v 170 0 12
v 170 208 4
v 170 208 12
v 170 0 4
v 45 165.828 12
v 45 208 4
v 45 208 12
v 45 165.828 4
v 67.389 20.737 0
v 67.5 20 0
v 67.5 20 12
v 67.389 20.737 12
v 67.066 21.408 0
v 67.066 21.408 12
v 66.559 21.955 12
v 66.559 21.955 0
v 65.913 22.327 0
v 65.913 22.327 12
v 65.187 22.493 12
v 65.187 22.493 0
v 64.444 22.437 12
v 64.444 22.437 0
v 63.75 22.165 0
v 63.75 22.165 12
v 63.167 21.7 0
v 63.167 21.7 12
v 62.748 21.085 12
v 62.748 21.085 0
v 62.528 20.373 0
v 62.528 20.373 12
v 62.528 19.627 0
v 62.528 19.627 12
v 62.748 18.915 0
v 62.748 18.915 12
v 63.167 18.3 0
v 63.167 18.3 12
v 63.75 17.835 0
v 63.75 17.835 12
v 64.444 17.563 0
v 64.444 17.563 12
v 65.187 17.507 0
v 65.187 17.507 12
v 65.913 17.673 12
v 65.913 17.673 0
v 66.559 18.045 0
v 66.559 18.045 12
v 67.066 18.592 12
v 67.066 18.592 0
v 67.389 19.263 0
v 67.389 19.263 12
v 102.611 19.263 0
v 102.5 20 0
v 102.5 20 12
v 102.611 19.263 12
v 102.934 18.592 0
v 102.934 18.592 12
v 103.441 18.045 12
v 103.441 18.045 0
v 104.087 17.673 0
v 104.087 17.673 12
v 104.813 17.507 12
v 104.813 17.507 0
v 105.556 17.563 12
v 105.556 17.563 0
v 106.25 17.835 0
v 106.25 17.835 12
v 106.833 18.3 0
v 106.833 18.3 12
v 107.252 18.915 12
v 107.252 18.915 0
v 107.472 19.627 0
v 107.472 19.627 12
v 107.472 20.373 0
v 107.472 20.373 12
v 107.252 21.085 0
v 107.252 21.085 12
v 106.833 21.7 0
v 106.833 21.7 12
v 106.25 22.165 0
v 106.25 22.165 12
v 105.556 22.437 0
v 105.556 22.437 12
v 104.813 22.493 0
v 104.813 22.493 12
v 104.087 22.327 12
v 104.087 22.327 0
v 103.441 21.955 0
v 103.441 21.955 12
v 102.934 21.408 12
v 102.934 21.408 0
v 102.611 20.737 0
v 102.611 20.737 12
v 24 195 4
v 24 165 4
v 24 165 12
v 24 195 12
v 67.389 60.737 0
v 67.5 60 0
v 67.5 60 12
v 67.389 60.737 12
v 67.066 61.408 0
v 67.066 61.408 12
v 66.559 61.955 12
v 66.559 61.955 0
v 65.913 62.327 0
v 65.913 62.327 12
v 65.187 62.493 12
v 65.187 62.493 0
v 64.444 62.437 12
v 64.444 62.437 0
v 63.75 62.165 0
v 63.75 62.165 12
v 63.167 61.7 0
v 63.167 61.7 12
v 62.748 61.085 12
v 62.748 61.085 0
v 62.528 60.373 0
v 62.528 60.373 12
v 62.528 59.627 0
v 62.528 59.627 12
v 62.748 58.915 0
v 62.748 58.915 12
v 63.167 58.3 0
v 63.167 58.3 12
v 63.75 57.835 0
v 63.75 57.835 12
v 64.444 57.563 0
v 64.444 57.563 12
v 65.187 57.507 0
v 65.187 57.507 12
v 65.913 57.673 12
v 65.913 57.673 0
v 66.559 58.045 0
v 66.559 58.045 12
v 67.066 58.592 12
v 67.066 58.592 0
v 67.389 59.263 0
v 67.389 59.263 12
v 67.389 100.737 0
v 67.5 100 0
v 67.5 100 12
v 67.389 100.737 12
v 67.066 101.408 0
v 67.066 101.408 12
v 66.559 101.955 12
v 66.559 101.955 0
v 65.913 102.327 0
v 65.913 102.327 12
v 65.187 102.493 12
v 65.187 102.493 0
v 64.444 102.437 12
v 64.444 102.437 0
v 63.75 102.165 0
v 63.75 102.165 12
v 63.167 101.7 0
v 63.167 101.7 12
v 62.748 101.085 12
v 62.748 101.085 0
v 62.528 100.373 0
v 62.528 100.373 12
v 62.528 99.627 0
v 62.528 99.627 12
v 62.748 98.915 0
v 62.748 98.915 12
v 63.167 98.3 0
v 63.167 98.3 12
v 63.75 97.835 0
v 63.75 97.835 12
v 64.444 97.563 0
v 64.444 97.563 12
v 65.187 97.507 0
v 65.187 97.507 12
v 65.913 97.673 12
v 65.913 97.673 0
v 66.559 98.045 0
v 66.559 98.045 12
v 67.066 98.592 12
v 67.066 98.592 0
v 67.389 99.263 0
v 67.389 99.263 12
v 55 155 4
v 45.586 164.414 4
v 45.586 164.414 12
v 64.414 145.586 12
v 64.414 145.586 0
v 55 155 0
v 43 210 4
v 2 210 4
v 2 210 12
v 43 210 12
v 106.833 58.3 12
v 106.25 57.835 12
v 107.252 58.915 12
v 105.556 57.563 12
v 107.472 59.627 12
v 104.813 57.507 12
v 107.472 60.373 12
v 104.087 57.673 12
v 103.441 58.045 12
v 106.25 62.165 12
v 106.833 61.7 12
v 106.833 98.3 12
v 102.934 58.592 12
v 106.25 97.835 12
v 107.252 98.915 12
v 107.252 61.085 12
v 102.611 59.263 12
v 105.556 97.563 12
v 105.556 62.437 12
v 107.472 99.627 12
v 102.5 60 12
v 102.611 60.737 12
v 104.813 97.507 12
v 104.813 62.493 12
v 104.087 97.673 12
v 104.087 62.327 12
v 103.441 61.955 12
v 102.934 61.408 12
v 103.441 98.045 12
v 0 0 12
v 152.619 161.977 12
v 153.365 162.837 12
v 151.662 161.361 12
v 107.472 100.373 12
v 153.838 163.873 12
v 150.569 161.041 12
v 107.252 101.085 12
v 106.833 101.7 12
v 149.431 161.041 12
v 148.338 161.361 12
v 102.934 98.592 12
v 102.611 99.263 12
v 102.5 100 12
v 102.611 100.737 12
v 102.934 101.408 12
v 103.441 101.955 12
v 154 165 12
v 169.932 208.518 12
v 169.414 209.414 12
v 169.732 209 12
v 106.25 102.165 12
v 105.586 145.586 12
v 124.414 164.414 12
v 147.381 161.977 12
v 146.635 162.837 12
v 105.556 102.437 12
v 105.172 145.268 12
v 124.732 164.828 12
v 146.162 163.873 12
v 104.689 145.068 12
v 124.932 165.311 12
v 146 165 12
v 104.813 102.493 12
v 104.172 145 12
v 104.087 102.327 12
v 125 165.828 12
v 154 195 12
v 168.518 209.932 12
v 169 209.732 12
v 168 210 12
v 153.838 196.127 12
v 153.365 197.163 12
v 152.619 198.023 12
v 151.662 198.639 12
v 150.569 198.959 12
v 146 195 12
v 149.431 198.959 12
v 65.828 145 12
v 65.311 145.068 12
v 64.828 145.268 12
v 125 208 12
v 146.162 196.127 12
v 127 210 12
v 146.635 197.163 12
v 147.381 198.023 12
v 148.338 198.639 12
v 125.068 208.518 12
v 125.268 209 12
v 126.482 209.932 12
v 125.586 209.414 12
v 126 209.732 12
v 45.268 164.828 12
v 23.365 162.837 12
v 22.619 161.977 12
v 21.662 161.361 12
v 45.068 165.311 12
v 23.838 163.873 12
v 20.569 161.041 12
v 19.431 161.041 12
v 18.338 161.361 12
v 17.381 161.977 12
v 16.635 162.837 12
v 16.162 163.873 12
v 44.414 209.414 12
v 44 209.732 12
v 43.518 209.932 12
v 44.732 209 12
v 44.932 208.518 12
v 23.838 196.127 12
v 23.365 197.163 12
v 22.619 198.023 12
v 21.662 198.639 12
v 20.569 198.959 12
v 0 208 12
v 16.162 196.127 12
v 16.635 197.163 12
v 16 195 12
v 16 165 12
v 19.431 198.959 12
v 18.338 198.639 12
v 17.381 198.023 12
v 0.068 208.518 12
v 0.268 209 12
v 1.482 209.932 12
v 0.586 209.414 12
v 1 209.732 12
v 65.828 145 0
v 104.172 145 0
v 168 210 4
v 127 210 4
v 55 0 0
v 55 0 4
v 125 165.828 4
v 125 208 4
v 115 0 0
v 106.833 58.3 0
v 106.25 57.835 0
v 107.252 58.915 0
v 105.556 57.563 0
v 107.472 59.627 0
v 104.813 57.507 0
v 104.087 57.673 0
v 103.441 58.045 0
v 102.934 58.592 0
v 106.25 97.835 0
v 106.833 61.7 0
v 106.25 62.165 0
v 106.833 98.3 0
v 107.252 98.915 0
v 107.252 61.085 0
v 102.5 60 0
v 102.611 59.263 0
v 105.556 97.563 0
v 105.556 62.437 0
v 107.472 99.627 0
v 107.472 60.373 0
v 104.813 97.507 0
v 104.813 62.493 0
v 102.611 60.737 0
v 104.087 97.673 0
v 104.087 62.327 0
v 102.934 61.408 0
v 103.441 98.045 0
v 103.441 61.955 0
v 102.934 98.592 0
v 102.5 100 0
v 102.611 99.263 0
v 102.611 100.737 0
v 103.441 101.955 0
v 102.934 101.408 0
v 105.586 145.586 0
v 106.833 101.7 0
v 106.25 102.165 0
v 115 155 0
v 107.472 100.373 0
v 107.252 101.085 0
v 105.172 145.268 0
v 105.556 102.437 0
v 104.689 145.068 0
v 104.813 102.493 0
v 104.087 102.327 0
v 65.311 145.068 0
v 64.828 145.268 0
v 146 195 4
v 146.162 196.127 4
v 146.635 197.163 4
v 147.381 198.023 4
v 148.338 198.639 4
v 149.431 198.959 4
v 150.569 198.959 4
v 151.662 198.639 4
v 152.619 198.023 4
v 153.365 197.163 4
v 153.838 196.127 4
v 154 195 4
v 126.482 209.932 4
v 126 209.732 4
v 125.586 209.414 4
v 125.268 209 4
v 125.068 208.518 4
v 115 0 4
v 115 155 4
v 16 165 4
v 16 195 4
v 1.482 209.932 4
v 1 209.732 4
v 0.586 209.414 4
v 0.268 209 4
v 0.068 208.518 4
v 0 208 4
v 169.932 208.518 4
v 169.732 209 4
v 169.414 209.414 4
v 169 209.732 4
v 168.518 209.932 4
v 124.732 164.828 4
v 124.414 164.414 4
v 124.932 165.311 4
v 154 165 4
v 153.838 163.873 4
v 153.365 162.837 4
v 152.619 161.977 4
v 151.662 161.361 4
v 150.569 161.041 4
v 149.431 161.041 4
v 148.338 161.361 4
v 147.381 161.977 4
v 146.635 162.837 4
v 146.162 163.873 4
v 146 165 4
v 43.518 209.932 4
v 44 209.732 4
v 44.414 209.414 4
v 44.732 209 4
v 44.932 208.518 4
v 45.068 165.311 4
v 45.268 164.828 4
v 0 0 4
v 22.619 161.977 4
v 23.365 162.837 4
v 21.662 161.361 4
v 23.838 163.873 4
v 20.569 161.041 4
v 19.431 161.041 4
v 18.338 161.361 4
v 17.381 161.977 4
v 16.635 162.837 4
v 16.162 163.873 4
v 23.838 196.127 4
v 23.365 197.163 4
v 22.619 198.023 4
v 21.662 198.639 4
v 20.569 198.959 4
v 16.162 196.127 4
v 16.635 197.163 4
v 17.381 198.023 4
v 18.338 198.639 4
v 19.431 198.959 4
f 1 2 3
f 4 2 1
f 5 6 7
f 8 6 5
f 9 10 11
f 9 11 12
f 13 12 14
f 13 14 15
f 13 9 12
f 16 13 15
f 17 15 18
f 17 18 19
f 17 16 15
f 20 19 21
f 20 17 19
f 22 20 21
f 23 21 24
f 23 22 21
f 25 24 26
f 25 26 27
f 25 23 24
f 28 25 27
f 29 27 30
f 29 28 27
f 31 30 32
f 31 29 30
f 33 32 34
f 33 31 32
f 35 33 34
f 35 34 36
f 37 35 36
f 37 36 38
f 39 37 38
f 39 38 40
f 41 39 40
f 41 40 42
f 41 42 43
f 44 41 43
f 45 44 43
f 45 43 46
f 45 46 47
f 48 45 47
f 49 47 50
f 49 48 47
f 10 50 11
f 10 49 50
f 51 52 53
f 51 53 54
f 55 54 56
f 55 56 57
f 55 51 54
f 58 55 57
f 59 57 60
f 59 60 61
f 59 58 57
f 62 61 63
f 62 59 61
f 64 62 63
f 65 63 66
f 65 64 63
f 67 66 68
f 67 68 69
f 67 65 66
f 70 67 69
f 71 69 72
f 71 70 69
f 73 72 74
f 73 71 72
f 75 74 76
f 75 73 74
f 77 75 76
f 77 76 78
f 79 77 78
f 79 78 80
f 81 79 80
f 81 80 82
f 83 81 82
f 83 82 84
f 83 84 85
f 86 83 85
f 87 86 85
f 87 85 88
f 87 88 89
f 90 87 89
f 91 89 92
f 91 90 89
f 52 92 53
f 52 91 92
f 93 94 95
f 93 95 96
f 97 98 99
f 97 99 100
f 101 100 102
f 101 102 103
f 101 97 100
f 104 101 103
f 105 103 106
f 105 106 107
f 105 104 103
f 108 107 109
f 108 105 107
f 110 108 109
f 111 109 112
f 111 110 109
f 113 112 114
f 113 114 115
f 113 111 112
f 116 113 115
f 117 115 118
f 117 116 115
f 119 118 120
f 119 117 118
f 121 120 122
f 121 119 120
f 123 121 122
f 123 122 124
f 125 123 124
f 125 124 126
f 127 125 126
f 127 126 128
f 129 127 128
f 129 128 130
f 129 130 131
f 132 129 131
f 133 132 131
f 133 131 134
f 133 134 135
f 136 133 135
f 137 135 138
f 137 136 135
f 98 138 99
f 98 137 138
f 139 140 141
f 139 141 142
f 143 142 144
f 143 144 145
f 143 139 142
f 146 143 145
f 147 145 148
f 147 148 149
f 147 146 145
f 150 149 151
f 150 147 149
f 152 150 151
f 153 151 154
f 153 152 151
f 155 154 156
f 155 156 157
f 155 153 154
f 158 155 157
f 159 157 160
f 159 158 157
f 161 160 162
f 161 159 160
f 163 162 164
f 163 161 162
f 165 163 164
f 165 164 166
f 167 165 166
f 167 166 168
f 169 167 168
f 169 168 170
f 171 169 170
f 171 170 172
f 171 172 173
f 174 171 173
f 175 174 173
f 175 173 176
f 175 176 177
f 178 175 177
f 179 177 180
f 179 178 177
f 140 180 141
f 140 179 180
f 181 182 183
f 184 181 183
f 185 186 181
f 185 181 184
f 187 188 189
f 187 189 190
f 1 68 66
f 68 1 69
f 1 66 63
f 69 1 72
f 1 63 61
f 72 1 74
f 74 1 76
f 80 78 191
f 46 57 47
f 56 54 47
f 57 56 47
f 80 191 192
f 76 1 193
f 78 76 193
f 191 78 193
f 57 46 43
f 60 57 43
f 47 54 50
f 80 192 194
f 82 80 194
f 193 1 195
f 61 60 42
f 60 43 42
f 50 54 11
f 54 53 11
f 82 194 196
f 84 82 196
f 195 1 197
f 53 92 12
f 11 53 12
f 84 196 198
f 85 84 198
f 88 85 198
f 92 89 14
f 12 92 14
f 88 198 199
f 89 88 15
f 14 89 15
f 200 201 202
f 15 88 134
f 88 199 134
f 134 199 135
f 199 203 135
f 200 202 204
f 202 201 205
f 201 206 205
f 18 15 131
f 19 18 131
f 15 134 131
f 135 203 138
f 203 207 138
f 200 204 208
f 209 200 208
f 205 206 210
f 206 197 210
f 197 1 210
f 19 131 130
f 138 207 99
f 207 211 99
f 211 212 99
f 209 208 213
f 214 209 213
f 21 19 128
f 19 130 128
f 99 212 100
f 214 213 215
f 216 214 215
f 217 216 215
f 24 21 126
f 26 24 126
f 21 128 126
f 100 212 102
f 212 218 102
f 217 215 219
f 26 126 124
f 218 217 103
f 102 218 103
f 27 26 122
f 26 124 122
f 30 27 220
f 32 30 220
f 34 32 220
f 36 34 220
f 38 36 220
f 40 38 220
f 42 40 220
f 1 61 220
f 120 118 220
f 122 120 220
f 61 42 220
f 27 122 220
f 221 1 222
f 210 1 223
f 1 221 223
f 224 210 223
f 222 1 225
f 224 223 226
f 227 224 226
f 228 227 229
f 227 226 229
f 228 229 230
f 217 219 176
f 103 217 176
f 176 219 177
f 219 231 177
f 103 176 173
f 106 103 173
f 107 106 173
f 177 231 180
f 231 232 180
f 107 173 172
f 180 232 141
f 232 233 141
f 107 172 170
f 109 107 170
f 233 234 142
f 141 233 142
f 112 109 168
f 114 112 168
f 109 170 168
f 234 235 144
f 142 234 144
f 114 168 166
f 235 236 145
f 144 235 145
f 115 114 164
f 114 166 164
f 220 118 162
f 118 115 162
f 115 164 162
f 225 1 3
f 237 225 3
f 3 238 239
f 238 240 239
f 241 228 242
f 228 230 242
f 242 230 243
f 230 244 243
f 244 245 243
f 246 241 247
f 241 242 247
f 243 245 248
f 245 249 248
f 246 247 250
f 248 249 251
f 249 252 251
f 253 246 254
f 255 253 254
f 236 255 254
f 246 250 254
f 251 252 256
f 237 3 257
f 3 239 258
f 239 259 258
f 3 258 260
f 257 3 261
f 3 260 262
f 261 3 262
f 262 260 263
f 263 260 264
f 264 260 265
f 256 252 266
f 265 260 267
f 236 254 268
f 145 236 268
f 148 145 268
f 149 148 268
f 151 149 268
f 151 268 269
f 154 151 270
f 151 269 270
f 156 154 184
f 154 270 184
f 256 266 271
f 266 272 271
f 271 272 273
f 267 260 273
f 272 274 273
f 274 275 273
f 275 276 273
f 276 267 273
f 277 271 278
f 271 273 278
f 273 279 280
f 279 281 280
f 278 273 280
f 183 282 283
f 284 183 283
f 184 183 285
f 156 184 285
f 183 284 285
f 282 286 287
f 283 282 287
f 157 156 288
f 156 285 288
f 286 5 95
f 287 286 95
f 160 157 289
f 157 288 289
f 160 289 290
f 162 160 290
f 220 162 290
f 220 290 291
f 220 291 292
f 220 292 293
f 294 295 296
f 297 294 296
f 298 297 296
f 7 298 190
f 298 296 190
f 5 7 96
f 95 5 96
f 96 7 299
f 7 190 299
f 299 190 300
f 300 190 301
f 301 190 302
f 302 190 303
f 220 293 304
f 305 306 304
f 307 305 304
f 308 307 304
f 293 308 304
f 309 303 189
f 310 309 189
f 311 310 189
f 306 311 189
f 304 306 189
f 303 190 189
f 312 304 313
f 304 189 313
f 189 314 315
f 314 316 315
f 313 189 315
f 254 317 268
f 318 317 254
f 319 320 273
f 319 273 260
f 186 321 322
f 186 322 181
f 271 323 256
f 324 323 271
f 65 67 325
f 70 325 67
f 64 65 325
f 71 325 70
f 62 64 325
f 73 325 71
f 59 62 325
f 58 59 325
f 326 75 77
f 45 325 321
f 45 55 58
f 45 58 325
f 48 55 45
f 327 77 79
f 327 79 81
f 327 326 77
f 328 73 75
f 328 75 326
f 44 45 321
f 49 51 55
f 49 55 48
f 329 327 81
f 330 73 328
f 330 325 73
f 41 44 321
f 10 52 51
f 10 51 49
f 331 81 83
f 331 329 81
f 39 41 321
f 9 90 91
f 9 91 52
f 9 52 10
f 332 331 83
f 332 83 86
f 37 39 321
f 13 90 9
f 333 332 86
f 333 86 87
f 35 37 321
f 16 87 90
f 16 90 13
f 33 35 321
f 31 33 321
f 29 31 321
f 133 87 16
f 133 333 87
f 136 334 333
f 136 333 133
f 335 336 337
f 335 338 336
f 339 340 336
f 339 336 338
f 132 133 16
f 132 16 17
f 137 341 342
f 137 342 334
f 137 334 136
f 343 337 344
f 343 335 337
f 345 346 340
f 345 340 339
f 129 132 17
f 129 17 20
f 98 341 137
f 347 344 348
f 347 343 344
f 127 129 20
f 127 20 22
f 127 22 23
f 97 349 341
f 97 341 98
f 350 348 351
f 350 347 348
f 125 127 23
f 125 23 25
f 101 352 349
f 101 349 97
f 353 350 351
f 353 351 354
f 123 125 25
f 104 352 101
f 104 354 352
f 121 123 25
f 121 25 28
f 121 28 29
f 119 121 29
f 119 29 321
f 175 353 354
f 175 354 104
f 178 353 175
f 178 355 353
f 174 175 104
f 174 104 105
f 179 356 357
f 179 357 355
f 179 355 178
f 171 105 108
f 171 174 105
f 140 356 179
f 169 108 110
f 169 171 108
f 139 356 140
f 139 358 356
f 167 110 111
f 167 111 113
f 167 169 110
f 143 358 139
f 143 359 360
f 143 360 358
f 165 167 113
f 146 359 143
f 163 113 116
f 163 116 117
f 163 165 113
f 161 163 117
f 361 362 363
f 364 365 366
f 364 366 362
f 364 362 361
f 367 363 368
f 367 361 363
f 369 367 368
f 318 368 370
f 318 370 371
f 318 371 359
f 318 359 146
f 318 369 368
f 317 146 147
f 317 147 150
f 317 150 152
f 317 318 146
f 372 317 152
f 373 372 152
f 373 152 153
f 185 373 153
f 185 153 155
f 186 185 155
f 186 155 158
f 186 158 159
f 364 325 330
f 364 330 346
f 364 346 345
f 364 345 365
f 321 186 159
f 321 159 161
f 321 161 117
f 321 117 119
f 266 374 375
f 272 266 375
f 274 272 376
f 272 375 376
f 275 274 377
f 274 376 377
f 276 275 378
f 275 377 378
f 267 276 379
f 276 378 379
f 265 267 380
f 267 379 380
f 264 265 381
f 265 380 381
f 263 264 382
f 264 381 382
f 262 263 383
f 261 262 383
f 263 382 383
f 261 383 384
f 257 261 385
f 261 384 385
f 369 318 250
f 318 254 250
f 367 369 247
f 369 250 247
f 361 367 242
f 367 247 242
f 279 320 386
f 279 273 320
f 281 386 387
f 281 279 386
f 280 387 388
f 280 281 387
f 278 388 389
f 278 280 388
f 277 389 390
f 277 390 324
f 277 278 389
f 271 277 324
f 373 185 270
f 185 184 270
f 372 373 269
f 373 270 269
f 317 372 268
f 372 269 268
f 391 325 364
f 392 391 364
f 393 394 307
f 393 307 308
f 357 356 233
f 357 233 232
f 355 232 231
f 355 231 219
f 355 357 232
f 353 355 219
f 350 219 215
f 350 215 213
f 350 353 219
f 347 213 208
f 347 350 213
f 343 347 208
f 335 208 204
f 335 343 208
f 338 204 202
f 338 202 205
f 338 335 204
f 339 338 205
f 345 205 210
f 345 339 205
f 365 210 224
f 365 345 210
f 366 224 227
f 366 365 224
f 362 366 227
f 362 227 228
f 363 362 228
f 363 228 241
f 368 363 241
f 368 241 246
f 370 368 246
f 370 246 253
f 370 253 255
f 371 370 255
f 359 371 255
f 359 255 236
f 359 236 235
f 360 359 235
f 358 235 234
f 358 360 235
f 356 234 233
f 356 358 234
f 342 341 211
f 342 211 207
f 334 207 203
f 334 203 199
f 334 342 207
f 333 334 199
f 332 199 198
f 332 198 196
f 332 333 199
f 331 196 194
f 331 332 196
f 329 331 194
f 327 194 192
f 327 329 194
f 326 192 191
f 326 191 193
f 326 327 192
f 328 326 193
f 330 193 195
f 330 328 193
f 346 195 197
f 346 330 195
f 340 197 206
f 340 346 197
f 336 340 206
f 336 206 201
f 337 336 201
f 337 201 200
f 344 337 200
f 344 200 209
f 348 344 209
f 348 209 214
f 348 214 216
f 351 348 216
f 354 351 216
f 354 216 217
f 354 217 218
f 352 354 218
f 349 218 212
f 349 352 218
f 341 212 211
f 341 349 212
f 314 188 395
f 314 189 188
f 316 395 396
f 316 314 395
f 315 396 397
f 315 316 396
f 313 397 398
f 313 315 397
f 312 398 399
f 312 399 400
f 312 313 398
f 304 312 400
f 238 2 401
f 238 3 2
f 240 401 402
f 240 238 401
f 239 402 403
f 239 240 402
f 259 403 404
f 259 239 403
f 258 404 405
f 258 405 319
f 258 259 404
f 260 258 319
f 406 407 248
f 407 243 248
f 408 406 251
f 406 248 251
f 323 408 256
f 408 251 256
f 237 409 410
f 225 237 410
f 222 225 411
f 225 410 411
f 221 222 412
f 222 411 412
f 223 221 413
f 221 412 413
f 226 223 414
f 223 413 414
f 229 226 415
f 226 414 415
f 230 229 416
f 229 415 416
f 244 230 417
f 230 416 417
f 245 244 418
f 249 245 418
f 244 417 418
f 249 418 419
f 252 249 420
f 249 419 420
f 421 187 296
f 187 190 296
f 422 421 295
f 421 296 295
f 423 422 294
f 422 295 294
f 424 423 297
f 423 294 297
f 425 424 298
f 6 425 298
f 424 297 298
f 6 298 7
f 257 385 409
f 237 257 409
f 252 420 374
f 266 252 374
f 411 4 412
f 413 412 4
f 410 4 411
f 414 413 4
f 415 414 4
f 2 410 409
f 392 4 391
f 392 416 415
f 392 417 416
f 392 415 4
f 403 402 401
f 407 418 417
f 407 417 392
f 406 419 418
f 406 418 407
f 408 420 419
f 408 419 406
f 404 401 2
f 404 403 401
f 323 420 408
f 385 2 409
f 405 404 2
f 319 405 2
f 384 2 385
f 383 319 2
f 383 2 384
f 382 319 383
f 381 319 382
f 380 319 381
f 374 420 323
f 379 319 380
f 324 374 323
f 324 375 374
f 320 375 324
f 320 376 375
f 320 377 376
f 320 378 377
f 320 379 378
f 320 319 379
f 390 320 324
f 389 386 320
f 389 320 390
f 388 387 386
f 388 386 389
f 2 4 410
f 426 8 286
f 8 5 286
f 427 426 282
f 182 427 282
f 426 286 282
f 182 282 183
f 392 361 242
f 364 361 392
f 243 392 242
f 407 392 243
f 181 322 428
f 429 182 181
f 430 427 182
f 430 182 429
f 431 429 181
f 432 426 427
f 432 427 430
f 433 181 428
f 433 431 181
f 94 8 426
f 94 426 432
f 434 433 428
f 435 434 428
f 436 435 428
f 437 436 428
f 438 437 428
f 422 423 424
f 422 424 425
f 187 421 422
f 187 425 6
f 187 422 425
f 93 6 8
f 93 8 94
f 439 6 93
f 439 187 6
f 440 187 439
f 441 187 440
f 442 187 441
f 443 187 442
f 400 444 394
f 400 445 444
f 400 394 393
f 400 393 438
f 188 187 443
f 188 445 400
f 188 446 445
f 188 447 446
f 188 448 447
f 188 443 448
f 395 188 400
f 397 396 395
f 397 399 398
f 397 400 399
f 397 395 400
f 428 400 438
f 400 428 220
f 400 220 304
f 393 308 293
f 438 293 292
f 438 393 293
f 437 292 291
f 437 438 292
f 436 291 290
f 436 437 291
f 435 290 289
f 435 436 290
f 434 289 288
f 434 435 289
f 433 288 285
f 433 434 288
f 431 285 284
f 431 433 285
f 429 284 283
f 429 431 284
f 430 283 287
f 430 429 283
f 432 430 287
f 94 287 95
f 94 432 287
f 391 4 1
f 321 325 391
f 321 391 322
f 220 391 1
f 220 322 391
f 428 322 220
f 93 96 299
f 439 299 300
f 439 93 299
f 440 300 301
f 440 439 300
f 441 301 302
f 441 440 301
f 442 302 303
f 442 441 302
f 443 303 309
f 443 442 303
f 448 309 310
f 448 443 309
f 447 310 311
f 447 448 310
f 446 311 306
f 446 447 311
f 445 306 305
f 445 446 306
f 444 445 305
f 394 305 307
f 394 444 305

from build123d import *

# Parameters (mm, degrees)
SKETCH1_R           = 2.5
BOSS_EXTRUDE1_DEPTH = 12
SKETCH3_W           = 55
SKETCH3_H           = 210
CUT_EXTRUDE1_DEPTH  = 4
FILLET1_R           = 2


with BuildPart() as part:
    # Sketch1 → Boss-Extrude1 (new body)
    with BuildSketch(Plane.XY):
        Polygon((0, 210), (45, 210), (45, 165), (65, 145), (105, 145), (125, 165), (125, 210), (170, 210), (170, 0), (0, 0), align=None)
        with Locations((65, 20)):
            Circle(SKETCH1_R, mode=Mode.SUBTRACT)
        with Locations((65, 60)):
            Circle(SKETCH1_R, mode=Mode.SUBTRACT)
        with Locations((65, 100)):
            Circle(SKETCH1_R, mode=Mode.SUBTRACT)
        with Locations(Location((105, 100, 0), (0, 0, 180))):
            Circle(SKETCH1_R, mode=Mode.SUBTRACT)
        with Locations(Location((105, 60, 0), (0, 0, 180))):
            Circle(SKETCH1_R, mode=Mode.SUBTRACT)
        with Locations(Location((105, 20, 0), (0, 0, 180))):
            Circle(SKETCH1_R, mode=Mode.SUBTRACT)
        with BuildLine():
            Line((154, 195), (154, 165))
            ThreePointArc((154, 165), (150, 161), (146, 165))
            Line((146, 165), (146, 195))
            ThreePointArc((146, 195), (150, 199), (154, 195))
        make_face(mode=Mode.SUBTRACT)
        with BuildLine():
            Line((16, 195), (16, 165))
            ThreePointArc((16, 165), (20, 161), (24, 165))
            Line((24, 165), (24, 195))
            ThreePointArc((24, 195), (20, 199), (16, 195))
        make_face(mode=Mode.SUBTRACT)
    extrude(amount=BOSS_EXTRUDE1_DEPTH)

    # Sketch3 → Cut-Extrude1 (cut)
    with BuildSketch(Plane(origin=(0, 0, 0), x_dir=(-1, 0, 0), z_dir=(0, 0, -1))):
        with Locations((-27.5, 105)):
            Rectangle(SKETCH3_W, SKETCH3_H)
        with Locations((-142.5, 105)):
            Rectangle(SKETCH3_W, SKETCH3_H)
    extrude(amount=-CUT_EXTRUDE1_DEPTH, mode=Mode.SUBTRACT)

    # Fillet1
    fillet1_edges = [part.edges().sort_by_distance(p)[0] for p in [
        (0, 210, 8),
        (45, 210, 8),
        (45, 165, 8),
        (65, 145, 6),
        (105, 145, 6),
        (125, 165, 8),
        (125, 210, 8),
        (170, 210, 8),
    ]]
    fillet(fillet1_edges, radius=FILLET1_R)


solid = part.part
